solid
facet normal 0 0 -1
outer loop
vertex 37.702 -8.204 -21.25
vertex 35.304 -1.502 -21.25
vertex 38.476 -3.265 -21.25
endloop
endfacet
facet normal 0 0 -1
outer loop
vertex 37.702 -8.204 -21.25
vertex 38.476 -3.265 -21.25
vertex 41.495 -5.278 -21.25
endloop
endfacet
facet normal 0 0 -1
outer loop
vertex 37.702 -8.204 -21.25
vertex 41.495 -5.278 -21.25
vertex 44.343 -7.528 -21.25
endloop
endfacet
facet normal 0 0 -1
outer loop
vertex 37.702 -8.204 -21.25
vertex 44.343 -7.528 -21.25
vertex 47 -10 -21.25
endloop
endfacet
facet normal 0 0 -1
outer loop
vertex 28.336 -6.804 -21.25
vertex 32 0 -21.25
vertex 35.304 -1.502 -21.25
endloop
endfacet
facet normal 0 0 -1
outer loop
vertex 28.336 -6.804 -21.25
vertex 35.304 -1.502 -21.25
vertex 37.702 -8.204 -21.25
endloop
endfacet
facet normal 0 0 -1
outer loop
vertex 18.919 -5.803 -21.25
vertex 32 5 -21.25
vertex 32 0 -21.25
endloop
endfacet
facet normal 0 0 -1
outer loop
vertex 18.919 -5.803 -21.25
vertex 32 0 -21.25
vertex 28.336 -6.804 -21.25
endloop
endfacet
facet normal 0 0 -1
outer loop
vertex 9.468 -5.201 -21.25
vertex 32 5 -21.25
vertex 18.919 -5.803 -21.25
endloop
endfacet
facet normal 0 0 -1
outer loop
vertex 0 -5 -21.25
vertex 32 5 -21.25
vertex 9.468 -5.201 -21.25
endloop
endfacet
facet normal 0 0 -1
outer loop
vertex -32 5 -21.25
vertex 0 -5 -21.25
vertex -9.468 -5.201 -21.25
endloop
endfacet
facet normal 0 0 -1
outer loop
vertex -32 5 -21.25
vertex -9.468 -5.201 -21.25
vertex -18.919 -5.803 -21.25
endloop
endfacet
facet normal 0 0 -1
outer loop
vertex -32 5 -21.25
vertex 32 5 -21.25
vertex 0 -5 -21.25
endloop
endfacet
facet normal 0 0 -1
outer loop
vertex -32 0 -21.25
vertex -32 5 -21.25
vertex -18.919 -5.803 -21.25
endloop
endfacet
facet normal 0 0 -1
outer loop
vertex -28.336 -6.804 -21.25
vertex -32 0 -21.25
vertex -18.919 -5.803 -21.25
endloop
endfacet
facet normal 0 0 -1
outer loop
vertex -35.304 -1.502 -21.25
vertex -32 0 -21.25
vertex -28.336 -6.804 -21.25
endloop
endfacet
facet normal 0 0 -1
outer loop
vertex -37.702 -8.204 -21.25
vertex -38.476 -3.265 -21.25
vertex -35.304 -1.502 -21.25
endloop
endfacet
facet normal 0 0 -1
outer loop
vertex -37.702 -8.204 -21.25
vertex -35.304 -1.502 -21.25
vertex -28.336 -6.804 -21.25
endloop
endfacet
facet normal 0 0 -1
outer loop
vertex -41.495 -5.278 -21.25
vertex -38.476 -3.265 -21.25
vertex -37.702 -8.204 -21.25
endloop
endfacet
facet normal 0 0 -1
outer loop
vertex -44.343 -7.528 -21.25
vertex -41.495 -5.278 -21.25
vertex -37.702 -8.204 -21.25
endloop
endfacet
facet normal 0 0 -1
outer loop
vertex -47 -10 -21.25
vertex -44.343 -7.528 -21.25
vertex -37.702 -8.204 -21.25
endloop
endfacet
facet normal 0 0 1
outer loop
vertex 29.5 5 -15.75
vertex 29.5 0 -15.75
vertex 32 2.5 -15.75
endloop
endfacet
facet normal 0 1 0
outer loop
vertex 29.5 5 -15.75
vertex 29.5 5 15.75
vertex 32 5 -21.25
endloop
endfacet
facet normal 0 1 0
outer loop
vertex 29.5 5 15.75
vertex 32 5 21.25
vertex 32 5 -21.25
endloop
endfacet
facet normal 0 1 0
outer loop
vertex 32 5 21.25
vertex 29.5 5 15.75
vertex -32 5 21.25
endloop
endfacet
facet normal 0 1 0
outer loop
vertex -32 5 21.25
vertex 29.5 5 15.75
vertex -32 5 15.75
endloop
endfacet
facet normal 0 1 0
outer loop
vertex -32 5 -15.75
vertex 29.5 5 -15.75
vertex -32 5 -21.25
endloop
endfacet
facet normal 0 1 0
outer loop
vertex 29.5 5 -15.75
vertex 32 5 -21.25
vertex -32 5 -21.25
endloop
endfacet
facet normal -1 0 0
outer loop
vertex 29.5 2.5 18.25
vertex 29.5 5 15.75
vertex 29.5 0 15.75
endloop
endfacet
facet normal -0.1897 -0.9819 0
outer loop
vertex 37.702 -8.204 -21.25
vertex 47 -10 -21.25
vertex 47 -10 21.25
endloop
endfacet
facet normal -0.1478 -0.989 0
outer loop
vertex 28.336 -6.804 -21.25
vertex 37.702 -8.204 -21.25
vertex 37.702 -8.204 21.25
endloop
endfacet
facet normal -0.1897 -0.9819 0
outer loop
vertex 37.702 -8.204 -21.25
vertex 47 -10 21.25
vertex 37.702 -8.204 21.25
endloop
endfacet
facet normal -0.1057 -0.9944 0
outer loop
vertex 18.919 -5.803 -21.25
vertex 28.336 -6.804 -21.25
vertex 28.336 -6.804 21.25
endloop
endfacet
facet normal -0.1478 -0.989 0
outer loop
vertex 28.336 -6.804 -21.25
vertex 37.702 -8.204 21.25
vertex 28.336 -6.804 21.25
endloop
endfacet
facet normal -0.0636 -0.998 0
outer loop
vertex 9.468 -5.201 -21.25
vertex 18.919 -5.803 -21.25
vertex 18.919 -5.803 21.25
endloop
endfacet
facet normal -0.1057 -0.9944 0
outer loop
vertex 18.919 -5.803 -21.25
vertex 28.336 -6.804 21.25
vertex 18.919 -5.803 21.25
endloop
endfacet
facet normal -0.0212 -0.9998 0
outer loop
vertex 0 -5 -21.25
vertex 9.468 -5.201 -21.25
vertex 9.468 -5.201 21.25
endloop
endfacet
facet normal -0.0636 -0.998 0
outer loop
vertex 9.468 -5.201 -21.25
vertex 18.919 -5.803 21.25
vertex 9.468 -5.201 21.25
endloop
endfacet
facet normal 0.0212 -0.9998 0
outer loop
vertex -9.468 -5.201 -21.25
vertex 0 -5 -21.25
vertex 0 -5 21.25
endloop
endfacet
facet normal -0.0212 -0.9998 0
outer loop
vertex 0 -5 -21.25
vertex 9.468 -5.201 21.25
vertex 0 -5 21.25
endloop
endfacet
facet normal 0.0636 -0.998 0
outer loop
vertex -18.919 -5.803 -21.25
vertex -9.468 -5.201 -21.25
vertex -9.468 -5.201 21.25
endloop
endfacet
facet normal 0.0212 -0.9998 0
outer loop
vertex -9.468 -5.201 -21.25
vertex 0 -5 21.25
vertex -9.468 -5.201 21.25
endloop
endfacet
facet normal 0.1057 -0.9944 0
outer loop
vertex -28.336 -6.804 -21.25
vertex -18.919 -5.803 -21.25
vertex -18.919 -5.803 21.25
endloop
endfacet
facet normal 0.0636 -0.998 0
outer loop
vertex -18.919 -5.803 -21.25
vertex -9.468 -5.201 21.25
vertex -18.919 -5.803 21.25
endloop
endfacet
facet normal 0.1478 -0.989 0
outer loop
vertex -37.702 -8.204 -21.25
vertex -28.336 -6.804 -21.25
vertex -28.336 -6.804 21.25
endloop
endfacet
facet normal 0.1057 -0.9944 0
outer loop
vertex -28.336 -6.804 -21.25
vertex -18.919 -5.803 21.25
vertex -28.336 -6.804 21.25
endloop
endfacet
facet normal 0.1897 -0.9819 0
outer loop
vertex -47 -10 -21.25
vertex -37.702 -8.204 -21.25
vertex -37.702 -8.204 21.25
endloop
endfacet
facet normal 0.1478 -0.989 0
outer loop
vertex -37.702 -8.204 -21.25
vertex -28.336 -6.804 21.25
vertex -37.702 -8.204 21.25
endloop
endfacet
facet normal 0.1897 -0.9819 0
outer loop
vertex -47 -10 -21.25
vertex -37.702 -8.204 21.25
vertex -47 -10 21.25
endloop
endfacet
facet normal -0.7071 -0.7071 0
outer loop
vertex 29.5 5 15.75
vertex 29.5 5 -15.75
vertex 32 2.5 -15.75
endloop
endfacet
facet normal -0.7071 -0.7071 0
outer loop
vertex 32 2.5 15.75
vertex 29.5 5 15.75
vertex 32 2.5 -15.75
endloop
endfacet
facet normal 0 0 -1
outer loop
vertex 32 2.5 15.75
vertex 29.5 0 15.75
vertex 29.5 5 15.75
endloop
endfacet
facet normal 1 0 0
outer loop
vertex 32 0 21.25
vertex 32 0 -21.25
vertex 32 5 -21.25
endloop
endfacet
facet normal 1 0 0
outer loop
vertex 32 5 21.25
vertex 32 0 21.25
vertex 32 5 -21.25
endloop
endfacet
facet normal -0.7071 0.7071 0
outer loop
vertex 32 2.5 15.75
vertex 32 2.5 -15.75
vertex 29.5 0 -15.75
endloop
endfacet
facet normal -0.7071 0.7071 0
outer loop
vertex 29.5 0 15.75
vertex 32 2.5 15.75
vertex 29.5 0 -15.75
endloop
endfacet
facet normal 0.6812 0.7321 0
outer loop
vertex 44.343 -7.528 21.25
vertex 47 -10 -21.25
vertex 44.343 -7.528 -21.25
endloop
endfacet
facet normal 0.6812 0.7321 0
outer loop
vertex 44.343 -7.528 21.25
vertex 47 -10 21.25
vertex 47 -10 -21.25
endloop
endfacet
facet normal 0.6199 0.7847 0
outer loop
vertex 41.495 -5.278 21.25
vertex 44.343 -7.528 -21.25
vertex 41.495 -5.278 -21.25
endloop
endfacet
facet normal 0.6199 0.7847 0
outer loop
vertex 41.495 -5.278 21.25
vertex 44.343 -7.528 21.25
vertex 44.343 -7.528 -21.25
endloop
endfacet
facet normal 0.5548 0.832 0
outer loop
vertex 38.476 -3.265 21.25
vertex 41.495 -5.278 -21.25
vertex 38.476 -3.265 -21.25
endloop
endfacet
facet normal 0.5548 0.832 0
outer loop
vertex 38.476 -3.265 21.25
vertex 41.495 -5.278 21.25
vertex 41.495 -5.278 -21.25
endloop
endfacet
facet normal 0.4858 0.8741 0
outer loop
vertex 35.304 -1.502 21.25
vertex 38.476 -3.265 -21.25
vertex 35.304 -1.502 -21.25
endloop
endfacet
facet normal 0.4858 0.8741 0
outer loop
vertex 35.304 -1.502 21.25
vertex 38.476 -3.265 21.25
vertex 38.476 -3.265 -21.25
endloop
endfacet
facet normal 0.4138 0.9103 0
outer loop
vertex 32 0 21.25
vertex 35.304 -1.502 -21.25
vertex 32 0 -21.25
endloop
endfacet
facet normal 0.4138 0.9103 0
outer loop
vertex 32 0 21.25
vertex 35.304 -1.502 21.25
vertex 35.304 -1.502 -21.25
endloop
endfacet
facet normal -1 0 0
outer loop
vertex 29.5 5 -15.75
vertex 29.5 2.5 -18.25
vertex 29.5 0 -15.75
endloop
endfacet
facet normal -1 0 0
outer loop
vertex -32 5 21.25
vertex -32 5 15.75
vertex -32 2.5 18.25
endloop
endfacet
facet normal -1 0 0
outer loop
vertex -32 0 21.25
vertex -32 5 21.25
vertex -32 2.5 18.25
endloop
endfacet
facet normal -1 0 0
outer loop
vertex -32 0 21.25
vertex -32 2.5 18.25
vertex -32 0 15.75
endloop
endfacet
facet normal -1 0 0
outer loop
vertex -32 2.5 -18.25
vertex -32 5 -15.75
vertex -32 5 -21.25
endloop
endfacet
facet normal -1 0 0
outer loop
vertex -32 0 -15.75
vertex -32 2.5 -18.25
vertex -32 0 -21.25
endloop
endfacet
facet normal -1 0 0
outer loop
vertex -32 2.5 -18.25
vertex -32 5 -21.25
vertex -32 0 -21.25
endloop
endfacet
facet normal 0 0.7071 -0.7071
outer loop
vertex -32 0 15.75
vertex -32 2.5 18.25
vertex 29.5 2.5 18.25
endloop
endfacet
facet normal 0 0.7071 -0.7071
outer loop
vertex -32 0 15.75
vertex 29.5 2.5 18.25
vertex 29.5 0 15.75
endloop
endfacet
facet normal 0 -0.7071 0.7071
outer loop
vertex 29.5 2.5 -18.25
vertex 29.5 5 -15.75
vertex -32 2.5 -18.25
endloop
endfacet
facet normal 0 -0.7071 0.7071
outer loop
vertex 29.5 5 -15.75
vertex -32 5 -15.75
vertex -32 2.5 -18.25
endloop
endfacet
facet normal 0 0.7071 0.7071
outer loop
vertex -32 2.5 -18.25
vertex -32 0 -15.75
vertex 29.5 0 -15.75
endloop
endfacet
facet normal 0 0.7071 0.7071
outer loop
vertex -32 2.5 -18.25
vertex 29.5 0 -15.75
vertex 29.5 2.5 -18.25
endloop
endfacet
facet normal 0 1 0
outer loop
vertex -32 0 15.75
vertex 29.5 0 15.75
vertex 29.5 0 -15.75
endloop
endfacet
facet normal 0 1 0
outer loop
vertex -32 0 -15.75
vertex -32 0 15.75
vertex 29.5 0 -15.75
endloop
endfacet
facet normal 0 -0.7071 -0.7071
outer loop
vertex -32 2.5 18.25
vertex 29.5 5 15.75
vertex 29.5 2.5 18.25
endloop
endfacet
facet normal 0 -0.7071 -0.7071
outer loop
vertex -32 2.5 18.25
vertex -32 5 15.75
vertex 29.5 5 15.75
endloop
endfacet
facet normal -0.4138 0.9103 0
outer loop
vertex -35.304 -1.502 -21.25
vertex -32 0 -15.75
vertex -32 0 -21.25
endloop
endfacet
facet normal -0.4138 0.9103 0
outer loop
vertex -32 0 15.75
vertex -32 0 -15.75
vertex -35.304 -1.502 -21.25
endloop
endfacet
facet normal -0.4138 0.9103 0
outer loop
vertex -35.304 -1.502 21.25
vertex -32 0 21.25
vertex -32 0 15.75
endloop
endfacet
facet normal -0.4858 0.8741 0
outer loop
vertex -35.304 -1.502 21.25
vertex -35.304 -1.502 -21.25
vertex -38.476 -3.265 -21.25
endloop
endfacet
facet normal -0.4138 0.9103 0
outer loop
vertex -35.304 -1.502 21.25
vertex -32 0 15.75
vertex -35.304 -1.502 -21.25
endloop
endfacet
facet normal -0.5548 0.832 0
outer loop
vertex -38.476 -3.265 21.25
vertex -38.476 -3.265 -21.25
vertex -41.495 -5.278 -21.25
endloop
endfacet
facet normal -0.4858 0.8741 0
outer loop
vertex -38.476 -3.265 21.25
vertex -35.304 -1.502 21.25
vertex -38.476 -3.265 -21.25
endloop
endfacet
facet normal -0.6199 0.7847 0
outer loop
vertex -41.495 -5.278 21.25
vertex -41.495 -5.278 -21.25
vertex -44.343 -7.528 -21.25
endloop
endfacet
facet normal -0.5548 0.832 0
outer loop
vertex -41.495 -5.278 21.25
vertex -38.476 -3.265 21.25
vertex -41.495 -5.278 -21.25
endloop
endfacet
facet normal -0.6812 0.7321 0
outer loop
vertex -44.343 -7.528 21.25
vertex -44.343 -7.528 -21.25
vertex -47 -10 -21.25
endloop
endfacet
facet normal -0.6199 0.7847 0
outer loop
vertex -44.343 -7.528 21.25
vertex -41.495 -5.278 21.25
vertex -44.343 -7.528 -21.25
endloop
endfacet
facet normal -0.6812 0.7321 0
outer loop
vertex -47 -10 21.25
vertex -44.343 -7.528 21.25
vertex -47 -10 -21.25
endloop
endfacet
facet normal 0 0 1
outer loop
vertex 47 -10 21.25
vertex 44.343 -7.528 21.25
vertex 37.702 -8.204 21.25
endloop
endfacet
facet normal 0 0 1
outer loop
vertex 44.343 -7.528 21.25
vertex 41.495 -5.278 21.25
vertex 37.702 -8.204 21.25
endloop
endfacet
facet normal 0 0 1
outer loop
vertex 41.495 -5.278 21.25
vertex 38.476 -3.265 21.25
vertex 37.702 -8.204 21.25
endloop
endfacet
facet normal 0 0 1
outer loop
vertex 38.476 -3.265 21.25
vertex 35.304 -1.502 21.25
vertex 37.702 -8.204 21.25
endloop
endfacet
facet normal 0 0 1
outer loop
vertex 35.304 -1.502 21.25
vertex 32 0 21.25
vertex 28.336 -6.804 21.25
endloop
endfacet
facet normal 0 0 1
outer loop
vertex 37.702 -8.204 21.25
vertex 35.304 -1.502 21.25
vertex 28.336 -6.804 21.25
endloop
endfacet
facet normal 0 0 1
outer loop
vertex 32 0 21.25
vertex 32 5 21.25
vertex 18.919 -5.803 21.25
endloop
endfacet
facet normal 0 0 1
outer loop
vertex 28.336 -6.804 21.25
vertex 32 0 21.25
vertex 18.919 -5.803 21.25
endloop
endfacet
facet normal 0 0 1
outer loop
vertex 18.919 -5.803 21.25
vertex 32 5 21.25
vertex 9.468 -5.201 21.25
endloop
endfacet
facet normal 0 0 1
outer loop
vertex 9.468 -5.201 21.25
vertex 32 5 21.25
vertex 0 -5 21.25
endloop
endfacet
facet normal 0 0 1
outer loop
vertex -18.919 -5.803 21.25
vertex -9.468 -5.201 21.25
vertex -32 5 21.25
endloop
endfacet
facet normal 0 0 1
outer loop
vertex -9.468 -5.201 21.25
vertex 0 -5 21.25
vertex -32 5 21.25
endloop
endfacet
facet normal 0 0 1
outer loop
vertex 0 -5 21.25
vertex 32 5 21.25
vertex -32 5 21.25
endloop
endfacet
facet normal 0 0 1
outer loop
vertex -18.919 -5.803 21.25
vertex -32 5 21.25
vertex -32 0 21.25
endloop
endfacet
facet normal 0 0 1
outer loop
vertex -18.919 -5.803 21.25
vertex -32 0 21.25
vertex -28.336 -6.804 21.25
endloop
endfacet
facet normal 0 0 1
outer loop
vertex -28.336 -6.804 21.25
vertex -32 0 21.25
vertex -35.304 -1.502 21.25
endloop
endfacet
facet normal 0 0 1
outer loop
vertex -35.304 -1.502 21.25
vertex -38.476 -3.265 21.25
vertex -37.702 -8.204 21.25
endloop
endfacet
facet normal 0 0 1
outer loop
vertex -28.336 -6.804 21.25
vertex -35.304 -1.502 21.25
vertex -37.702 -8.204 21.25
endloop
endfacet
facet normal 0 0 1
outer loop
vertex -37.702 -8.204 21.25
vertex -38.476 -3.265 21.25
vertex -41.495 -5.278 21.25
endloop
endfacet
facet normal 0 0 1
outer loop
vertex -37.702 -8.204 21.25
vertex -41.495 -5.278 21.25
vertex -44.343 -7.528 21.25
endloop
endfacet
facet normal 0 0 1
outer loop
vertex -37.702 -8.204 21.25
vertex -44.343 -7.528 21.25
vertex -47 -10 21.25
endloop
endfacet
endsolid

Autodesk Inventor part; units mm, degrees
ref_plane "YZ Plane" through (0, 0, 0) normal (1, 0, 0) x (0, 1, 0)
ref_plane "XZ Plane" through (0, 0, 0) normal (0, 1, 0) x (-1, 0, 0)
sketch "Sketch5" plane through (0, 0, 0) normal (0, 0, 1) x (1, 0, 0)
  line L0 (-32, -5) -> (32, -5)
  line L1 (32, -5) -> (32, 5)
  line L2 (32, 5) -> (-32, 5)
  line L3 (-32, 5) -> (-32, -5)
  line L4 (-32, -5) -> (32, 5) construction
  line L5 (32, -5) -> (-32, 5) construction
  point P0 (0, 0)
  dimension "d17" = 64
  dimension "d18" = 10
extrude "Extrusion5" add sketch "Sketch5" along normal mid plane 46.5
ref_plane "Work Plane2" through (0, 0, 15.75) normal (0, 0, 1) x (1, 0, 0)
sketch "Sketch7" plane through (0, 0, 15.75) normal (0, 0, 1) x (1, 0, 0)
  line L0 (32, 5) -> (-32, 5) projected
  line L1 (-32, 5) -> (-32, -5) projected
  line L2 (-32, -5) -> (32, -5) projected
  line L3 (32, -5) -> (32, 5) projected
  line L4 (32, -5) -> (32, 5) projected
  line L5 (-32, -5) -> (32, -5) projected
  line L6 (32, 5) -> (-32, 5) projected
  line L7 (29.5, 5) -> (29.5, 0)
  line L8 (29.5, 5) -> (32, 2.5)
  line L9 (32, 2.5) -> (29.5, 0)
  point P0 (0, 0)
extrude "Extrusion6" cut sketch "Sketch7" against normal blind 31.5 contours L8 L9 L7
sketch "Sketch8" plane through (-32, -5, 23.25) normal (-1, 0, 0) x (0, 0, 1)
  line L0 (-46.5, 10) -> (0, 10) projected
  line L1 (-46.5, 10) -> (-41.5, 10)
  line L2 (-41.5, 0) -> (-46.5, 0)
  line L3 (-46.5, 5) -> (-46.5, 10)
  line L4 (0, 10) -> (-5, 10)
  line L5 (-46.5, 0) -> (-46.5, 10) projected
  line L6 (-41.5, 10) -> (-39, 10)
  line L7 (-39, 10) -> (-41.5, 7.5)
  line L8 (-39, 7.5) -> (-39, 5) projected
  line L9 (-39, 5) -> (-41.5, 7.5)
  line L10 (-5, 10) -> (-7.5, 10)
  line L11 (-7.5, 10) -> (-5, 7.5)
  line L12 (-7.5, 5) -> (-7.5, 7.5) projected
  line L13 (-5, 7.5) -> (-7.5, 5)
  line L14 (-7.5, 5) -> (-39, 5)
  line L15 (-39, 10) -> (-39, 7.5) projected
  line L16 (-7.5, 7.5) -> (-7.5, 10) projected
  line L17 (-39, 10) -> (-7.5, 10)
  line L18 (-39, 10) -> (-7.5, 10)
  line L19 (-7.5, 5) -> (-39, 5) projected
  line L20 (-39, 5) -> (-7.5, 5)
  point P0 (-23.25, 5)
extrude "Extrusion8" cut sketch "Sketch8" against normal blind 61.5
sketch "Sketch9" plane through (-32, -5, -23.25) normal (-1, 0, 0) x (0, 0, 1)
  line L0 (0, 10) -> (46.5, 10) projected
  line L1 (0, 10) -> (2, 10)
  line L2 (2, 10) -> (2, 0)
  line L3 (2, 0) -> (0, 0)
  line L4 (0, 0) -> (0, 10)
  line L5 (46.5, 10) -> (44.5, 10)
  line L6 (44.5, 10) -> (44.5, 0)
  line L7 (44.5, 0) -> (46.5, 0)
  line L8 (46.5, 0) -> (46.5, 10)
  point P0 (23.25, 5)
  dimension "d37" = 2
  dimension "d38" = 2
extrude "Extrusion9" cut sketch "Sketch9" against normal through all
sketch "Sketch10" plane through (-32, -5, 21.25) normal (0, 0, 1) x (1, 0, 0)
  line L0 (0, 10) -> (0, 0) projected
  line L1 (0, 0) -> (0, 5)
  line L2 (0, 5) -> (64, 5)
  line L3 (64, 5) -> (64, 0)
  line L4 (64, 0) -> (0, 0)
  line L5 (0, 0) -> (0, 5)
  line L6 (0, 0) -> (64, 0) projected
  line L7 (32, 0) -> (32, 10)
  line L8 (0, 10) -> (61.5, 10) projected
  line L9 (64, 0) -> (64, 5)
  arc A0 (79, -5) -> (-15, -5) centre (32, -223.4) ccw
  arc A1 (0, 5) -> (-15, -5) centre (16.9556, -36.6834) ccw
  arc A2 (79, -5) -> (64, 5) centre (47.0444, -36.6834) ccw
  line L10 (-9.1083, 0) -> (73.1083, 0)
  point P0 (32, 5)
  dimension "d46" = 45
  dimension "d47" = 45
extrude "Extrusion11" add sketch "Sketch10" against normal blind 42.5 contours L0 L10 A1 | L4 A0 A1 L10 | L4 L10 A2 A0 | A2 L10 L3
properties part number "Enclosure-Bottom"
